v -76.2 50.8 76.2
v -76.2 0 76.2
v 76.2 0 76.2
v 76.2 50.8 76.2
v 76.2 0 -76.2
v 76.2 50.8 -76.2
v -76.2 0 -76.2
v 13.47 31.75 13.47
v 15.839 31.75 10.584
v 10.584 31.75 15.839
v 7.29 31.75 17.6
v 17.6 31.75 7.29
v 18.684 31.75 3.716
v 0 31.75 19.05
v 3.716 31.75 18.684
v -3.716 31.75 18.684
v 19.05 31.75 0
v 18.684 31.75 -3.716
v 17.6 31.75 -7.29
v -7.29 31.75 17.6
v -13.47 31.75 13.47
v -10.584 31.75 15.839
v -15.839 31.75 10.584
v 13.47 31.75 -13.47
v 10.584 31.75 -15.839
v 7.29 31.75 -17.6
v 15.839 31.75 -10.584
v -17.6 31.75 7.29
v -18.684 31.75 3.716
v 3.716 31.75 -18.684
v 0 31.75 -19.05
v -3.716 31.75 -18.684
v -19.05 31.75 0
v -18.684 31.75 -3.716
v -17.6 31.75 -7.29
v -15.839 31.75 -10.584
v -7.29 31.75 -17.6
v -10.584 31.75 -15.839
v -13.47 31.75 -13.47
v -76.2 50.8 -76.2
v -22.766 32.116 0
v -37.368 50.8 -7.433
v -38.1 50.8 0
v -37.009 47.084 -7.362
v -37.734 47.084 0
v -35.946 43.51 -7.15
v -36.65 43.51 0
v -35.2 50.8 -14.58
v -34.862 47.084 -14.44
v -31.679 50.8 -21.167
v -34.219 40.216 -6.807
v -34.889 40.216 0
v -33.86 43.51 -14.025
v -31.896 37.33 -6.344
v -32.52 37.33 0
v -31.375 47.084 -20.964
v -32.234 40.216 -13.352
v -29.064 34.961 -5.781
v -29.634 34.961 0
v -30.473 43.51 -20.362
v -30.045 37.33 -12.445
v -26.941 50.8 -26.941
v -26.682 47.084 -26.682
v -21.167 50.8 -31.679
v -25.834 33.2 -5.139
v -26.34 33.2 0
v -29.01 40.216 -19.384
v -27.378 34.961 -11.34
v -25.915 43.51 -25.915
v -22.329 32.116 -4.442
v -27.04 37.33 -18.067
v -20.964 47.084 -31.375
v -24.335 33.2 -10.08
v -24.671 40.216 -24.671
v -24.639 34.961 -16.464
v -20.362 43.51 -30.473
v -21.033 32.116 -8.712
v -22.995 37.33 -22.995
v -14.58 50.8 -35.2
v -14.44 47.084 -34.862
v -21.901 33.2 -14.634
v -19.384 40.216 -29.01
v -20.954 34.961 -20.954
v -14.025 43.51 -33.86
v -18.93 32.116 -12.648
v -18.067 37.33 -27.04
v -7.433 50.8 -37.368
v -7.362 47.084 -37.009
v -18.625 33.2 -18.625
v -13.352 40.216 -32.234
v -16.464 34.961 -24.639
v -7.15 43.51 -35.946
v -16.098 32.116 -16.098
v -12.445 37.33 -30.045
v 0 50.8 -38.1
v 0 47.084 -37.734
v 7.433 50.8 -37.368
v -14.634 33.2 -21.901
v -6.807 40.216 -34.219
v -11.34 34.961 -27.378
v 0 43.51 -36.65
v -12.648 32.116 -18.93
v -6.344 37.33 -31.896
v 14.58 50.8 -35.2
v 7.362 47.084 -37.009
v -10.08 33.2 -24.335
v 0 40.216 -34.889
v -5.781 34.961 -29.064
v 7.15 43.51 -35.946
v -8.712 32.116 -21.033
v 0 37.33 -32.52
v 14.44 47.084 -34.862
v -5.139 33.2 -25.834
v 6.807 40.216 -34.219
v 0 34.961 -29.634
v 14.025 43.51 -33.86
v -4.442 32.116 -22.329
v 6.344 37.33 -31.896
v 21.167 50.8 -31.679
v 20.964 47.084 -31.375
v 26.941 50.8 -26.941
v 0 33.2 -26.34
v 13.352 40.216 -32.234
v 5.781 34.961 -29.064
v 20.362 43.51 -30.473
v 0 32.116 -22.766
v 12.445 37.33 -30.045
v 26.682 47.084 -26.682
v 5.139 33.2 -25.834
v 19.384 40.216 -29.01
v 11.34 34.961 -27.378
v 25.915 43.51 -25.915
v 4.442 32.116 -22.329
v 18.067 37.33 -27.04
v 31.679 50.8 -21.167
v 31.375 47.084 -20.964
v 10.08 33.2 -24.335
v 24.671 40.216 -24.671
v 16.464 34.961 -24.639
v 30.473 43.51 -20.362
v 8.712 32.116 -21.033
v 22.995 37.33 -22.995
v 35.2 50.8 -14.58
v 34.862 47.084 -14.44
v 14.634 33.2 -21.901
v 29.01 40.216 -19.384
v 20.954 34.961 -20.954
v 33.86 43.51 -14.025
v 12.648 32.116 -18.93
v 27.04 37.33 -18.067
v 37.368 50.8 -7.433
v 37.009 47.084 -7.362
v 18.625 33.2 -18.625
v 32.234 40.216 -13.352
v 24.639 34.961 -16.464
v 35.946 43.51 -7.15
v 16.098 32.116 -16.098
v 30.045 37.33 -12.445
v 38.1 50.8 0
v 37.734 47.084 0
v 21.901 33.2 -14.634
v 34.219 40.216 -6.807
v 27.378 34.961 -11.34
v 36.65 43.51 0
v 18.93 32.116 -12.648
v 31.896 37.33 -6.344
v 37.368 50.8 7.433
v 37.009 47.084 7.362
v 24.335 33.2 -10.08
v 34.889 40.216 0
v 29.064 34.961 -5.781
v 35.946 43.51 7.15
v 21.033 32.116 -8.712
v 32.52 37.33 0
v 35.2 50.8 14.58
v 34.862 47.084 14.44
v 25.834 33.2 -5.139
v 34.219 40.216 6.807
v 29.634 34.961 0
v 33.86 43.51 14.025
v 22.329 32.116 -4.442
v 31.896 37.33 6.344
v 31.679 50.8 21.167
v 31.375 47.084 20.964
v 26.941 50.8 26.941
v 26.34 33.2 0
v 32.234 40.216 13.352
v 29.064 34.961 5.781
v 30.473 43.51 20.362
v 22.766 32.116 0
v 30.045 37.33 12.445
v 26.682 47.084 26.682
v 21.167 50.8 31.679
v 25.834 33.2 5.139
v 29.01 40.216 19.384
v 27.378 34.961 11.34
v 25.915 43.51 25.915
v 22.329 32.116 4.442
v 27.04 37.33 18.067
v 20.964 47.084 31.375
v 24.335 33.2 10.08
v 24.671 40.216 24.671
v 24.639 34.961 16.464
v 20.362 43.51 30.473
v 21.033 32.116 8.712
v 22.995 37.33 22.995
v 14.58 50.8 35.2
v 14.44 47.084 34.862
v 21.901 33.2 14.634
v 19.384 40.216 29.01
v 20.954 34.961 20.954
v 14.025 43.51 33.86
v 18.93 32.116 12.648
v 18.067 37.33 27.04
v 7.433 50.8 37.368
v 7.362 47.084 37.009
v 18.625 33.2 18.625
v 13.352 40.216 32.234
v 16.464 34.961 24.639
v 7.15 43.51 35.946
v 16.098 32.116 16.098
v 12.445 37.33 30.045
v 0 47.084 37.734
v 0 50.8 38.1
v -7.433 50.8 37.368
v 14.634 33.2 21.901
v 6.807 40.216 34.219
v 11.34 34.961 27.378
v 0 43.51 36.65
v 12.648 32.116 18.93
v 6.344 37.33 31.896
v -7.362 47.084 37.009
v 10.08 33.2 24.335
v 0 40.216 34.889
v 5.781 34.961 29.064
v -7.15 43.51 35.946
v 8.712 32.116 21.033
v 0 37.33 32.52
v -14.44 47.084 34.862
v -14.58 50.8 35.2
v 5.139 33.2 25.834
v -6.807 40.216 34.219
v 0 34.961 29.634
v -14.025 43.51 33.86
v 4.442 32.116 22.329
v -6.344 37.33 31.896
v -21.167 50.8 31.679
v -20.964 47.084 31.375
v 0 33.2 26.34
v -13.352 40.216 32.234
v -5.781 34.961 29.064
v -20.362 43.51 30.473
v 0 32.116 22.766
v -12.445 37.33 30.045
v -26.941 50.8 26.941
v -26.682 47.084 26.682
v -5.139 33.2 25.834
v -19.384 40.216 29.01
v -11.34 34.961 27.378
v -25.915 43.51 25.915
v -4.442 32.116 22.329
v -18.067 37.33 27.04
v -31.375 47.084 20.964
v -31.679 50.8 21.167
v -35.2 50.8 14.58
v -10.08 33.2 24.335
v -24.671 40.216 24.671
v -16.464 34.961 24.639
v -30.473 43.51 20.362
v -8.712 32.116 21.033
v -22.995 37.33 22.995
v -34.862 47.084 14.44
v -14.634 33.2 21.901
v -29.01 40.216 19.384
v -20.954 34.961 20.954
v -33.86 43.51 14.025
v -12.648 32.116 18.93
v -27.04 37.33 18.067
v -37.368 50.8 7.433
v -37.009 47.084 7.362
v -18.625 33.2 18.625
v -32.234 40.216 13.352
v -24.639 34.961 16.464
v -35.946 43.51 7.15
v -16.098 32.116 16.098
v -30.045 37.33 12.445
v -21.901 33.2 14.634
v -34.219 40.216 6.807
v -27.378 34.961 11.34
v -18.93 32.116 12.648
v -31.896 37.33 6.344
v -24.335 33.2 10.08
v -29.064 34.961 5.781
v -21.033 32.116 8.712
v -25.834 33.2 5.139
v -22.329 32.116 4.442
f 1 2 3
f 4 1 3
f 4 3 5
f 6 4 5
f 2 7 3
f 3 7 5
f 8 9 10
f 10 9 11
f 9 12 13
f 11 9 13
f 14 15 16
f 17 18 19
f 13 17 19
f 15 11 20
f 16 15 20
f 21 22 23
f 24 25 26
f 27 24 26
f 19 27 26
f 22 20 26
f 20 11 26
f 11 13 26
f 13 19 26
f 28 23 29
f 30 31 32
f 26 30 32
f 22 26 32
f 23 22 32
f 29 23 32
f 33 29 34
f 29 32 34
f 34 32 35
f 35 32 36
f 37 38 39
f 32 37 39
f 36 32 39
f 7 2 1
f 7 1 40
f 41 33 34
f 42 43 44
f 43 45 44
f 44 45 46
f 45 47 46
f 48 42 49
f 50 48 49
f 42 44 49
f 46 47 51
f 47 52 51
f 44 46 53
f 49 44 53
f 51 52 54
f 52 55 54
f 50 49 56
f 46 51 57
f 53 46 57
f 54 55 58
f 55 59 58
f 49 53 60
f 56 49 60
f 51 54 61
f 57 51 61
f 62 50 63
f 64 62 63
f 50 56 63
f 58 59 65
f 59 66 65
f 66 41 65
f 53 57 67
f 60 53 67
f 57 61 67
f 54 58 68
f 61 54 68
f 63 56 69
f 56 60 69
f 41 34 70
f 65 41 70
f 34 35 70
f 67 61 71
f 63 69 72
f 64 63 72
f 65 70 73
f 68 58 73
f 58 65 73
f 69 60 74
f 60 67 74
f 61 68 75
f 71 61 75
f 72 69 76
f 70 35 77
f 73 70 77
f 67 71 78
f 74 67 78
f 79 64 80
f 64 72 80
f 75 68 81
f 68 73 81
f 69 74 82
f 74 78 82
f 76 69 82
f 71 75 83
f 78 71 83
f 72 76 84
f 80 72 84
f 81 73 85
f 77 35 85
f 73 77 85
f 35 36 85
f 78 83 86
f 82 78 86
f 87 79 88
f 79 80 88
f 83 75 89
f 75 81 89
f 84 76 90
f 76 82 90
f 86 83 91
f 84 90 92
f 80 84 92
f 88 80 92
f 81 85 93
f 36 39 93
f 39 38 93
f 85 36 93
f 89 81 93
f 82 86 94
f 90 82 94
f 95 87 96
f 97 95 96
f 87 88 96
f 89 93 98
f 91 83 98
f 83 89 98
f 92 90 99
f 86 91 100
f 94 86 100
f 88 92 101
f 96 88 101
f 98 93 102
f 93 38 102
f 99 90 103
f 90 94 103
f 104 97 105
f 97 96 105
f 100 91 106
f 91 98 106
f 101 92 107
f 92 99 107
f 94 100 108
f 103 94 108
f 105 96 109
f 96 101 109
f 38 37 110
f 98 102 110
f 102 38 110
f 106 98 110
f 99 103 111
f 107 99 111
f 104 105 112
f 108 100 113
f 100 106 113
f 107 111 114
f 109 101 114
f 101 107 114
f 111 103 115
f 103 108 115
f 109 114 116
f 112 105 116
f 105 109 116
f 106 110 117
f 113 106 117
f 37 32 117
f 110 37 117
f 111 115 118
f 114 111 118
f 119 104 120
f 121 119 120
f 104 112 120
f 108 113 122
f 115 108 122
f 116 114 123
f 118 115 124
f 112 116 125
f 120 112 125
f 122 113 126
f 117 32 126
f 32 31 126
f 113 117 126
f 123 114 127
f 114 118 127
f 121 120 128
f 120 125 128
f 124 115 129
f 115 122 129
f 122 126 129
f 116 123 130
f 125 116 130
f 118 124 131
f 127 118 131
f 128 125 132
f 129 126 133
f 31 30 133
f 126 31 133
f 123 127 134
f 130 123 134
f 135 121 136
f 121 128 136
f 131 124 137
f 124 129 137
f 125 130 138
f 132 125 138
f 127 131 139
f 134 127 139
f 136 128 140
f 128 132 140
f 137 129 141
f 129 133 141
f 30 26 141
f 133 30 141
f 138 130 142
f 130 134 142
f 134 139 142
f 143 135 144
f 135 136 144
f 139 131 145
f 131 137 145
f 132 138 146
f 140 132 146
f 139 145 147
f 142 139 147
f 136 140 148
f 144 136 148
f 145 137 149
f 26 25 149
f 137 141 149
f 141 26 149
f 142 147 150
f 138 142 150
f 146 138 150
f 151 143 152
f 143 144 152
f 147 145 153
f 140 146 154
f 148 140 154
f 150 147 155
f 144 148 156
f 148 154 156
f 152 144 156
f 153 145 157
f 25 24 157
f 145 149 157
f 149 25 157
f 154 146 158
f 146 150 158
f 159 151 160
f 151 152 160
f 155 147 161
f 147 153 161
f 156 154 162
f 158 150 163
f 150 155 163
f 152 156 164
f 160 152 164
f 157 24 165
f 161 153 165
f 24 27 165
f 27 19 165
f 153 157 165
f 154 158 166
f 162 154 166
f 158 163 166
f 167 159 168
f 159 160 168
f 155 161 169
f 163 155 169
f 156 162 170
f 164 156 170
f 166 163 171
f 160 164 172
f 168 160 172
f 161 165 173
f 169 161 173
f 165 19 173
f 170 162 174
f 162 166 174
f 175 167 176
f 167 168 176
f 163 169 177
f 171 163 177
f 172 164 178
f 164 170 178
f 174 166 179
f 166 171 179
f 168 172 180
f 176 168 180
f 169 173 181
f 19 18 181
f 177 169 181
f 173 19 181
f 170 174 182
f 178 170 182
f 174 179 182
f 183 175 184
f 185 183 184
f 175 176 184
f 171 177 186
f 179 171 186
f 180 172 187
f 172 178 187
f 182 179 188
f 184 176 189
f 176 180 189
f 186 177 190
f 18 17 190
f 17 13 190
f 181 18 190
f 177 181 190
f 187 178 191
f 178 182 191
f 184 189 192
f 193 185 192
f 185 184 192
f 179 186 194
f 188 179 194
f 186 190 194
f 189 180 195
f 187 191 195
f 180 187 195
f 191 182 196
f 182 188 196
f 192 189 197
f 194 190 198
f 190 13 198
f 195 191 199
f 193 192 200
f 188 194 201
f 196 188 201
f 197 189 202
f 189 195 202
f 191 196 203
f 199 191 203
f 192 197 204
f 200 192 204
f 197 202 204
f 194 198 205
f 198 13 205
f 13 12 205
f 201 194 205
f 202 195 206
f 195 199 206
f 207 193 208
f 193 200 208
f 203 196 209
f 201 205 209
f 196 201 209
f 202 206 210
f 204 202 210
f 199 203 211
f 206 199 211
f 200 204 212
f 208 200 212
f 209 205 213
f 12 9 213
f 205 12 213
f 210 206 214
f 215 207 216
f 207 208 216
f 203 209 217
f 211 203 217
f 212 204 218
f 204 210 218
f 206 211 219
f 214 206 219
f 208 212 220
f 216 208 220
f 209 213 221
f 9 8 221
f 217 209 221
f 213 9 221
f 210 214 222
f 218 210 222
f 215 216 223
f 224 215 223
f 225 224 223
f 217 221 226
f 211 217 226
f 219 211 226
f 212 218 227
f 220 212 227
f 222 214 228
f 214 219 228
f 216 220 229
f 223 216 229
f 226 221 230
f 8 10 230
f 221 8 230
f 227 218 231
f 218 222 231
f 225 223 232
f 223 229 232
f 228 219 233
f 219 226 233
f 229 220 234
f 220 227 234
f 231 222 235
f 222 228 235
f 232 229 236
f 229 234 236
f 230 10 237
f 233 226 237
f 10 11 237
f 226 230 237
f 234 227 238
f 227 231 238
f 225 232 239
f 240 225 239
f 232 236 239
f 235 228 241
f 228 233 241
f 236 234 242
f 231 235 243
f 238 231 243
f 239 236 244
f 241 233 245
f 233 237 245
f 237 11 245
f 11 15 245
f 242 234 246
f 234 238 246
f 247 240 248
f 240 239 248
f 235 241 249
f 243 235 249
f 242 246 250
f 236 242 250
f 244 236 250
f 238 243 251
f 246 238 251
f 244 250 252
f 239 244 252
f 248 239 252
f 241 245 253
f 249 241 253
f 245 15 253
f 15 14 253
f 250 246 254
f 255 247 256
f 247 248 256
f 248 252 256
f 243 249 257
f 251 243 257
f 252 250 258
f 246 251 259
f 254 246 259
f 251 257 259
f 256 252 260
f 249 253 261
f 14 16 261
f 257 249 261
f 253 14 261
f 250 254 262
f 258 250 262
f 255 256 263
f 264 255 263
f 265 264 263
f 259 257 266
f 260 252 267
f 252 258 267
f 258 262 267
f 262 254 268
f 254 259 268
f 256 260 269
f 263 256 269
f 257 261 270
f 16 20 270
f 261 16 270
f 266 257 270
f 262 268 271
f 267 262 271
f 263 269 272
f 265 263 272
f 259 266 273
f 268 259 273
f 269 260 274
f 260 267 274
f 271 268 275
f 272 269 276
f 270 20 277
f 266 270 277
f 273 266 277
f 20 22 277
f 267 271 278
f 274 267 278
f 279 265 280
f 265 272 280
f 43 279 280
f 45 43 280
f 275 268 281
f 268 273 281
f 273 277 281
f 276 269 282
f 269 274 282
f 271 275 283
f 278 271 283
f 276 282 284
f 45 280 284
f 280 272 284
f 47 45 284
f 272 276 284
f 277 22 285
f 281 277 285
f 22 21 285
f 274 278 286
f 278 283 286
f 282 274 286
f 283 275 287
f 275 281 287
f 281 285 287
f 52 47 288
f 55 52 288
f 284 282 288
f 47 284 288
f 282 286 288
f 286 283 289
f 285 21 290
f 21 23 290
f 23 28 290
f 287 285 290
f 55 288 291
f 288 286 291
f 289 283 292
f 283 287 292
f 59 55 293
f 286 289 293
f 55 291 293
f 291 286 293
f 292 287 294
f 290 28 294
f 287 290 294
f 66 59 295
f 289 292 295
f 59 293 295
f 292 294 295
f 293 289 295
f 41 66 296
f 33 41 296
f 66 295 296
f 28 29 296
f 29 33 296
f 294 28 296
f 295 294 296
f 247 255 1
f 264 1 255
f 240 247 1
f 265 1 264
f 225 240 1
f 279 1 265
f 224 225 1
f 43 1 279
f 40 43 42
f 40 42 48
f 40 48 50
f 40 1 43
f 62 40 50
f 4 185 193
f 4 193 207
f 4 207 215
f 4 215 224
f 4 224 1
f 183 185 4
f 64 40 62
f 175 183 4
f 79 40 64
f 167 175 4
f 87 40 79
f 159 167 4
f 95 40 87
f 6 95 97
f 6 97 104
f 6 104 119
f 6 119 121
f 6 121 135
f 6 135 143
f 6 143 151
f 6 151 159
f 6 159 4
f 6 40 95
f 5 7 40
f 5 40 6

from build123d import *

# Parameters (mm, degrees)
SKETCH2_W           = 152.4
SKETCH2_H           = 152.4
BOSS_EXTRUDE1_DEPTH = 50.8


with BuildPart() as part:
    # Sketch2 → Boss-Extrude1 (new body)
    with BuildSketch(Plane(origin=(0, 0, 0), x_dir=(1, 0, 0), z_dir=(0, 1, 0))):
        Rectangle(SKETCH2_W, SKETCH2_H)
    extrude(amount=BOSS_EXTRUDE1_DEPTH)

    # Sketch3 → Cut-Revolve1 (revolve, cut)
    with BuildSketch(Plane.XY):
        with BuildLine():
            Line((-19.05, 31.75), (0, 31.75))
            Line((0, 31.75), (0, 50.8))
            Line((0, 50.8), (-38.1, 50.8))
            ThreePointArc((-38.1, 50.8), (-32.520384182, 37.329615818), (-19.05, 31.75))
        make_face()
    revolve(axis=Axis((0, 50.8, 0), (0, -1, 0)), mode=Mode.SUBTRACT)


solid = part.part
